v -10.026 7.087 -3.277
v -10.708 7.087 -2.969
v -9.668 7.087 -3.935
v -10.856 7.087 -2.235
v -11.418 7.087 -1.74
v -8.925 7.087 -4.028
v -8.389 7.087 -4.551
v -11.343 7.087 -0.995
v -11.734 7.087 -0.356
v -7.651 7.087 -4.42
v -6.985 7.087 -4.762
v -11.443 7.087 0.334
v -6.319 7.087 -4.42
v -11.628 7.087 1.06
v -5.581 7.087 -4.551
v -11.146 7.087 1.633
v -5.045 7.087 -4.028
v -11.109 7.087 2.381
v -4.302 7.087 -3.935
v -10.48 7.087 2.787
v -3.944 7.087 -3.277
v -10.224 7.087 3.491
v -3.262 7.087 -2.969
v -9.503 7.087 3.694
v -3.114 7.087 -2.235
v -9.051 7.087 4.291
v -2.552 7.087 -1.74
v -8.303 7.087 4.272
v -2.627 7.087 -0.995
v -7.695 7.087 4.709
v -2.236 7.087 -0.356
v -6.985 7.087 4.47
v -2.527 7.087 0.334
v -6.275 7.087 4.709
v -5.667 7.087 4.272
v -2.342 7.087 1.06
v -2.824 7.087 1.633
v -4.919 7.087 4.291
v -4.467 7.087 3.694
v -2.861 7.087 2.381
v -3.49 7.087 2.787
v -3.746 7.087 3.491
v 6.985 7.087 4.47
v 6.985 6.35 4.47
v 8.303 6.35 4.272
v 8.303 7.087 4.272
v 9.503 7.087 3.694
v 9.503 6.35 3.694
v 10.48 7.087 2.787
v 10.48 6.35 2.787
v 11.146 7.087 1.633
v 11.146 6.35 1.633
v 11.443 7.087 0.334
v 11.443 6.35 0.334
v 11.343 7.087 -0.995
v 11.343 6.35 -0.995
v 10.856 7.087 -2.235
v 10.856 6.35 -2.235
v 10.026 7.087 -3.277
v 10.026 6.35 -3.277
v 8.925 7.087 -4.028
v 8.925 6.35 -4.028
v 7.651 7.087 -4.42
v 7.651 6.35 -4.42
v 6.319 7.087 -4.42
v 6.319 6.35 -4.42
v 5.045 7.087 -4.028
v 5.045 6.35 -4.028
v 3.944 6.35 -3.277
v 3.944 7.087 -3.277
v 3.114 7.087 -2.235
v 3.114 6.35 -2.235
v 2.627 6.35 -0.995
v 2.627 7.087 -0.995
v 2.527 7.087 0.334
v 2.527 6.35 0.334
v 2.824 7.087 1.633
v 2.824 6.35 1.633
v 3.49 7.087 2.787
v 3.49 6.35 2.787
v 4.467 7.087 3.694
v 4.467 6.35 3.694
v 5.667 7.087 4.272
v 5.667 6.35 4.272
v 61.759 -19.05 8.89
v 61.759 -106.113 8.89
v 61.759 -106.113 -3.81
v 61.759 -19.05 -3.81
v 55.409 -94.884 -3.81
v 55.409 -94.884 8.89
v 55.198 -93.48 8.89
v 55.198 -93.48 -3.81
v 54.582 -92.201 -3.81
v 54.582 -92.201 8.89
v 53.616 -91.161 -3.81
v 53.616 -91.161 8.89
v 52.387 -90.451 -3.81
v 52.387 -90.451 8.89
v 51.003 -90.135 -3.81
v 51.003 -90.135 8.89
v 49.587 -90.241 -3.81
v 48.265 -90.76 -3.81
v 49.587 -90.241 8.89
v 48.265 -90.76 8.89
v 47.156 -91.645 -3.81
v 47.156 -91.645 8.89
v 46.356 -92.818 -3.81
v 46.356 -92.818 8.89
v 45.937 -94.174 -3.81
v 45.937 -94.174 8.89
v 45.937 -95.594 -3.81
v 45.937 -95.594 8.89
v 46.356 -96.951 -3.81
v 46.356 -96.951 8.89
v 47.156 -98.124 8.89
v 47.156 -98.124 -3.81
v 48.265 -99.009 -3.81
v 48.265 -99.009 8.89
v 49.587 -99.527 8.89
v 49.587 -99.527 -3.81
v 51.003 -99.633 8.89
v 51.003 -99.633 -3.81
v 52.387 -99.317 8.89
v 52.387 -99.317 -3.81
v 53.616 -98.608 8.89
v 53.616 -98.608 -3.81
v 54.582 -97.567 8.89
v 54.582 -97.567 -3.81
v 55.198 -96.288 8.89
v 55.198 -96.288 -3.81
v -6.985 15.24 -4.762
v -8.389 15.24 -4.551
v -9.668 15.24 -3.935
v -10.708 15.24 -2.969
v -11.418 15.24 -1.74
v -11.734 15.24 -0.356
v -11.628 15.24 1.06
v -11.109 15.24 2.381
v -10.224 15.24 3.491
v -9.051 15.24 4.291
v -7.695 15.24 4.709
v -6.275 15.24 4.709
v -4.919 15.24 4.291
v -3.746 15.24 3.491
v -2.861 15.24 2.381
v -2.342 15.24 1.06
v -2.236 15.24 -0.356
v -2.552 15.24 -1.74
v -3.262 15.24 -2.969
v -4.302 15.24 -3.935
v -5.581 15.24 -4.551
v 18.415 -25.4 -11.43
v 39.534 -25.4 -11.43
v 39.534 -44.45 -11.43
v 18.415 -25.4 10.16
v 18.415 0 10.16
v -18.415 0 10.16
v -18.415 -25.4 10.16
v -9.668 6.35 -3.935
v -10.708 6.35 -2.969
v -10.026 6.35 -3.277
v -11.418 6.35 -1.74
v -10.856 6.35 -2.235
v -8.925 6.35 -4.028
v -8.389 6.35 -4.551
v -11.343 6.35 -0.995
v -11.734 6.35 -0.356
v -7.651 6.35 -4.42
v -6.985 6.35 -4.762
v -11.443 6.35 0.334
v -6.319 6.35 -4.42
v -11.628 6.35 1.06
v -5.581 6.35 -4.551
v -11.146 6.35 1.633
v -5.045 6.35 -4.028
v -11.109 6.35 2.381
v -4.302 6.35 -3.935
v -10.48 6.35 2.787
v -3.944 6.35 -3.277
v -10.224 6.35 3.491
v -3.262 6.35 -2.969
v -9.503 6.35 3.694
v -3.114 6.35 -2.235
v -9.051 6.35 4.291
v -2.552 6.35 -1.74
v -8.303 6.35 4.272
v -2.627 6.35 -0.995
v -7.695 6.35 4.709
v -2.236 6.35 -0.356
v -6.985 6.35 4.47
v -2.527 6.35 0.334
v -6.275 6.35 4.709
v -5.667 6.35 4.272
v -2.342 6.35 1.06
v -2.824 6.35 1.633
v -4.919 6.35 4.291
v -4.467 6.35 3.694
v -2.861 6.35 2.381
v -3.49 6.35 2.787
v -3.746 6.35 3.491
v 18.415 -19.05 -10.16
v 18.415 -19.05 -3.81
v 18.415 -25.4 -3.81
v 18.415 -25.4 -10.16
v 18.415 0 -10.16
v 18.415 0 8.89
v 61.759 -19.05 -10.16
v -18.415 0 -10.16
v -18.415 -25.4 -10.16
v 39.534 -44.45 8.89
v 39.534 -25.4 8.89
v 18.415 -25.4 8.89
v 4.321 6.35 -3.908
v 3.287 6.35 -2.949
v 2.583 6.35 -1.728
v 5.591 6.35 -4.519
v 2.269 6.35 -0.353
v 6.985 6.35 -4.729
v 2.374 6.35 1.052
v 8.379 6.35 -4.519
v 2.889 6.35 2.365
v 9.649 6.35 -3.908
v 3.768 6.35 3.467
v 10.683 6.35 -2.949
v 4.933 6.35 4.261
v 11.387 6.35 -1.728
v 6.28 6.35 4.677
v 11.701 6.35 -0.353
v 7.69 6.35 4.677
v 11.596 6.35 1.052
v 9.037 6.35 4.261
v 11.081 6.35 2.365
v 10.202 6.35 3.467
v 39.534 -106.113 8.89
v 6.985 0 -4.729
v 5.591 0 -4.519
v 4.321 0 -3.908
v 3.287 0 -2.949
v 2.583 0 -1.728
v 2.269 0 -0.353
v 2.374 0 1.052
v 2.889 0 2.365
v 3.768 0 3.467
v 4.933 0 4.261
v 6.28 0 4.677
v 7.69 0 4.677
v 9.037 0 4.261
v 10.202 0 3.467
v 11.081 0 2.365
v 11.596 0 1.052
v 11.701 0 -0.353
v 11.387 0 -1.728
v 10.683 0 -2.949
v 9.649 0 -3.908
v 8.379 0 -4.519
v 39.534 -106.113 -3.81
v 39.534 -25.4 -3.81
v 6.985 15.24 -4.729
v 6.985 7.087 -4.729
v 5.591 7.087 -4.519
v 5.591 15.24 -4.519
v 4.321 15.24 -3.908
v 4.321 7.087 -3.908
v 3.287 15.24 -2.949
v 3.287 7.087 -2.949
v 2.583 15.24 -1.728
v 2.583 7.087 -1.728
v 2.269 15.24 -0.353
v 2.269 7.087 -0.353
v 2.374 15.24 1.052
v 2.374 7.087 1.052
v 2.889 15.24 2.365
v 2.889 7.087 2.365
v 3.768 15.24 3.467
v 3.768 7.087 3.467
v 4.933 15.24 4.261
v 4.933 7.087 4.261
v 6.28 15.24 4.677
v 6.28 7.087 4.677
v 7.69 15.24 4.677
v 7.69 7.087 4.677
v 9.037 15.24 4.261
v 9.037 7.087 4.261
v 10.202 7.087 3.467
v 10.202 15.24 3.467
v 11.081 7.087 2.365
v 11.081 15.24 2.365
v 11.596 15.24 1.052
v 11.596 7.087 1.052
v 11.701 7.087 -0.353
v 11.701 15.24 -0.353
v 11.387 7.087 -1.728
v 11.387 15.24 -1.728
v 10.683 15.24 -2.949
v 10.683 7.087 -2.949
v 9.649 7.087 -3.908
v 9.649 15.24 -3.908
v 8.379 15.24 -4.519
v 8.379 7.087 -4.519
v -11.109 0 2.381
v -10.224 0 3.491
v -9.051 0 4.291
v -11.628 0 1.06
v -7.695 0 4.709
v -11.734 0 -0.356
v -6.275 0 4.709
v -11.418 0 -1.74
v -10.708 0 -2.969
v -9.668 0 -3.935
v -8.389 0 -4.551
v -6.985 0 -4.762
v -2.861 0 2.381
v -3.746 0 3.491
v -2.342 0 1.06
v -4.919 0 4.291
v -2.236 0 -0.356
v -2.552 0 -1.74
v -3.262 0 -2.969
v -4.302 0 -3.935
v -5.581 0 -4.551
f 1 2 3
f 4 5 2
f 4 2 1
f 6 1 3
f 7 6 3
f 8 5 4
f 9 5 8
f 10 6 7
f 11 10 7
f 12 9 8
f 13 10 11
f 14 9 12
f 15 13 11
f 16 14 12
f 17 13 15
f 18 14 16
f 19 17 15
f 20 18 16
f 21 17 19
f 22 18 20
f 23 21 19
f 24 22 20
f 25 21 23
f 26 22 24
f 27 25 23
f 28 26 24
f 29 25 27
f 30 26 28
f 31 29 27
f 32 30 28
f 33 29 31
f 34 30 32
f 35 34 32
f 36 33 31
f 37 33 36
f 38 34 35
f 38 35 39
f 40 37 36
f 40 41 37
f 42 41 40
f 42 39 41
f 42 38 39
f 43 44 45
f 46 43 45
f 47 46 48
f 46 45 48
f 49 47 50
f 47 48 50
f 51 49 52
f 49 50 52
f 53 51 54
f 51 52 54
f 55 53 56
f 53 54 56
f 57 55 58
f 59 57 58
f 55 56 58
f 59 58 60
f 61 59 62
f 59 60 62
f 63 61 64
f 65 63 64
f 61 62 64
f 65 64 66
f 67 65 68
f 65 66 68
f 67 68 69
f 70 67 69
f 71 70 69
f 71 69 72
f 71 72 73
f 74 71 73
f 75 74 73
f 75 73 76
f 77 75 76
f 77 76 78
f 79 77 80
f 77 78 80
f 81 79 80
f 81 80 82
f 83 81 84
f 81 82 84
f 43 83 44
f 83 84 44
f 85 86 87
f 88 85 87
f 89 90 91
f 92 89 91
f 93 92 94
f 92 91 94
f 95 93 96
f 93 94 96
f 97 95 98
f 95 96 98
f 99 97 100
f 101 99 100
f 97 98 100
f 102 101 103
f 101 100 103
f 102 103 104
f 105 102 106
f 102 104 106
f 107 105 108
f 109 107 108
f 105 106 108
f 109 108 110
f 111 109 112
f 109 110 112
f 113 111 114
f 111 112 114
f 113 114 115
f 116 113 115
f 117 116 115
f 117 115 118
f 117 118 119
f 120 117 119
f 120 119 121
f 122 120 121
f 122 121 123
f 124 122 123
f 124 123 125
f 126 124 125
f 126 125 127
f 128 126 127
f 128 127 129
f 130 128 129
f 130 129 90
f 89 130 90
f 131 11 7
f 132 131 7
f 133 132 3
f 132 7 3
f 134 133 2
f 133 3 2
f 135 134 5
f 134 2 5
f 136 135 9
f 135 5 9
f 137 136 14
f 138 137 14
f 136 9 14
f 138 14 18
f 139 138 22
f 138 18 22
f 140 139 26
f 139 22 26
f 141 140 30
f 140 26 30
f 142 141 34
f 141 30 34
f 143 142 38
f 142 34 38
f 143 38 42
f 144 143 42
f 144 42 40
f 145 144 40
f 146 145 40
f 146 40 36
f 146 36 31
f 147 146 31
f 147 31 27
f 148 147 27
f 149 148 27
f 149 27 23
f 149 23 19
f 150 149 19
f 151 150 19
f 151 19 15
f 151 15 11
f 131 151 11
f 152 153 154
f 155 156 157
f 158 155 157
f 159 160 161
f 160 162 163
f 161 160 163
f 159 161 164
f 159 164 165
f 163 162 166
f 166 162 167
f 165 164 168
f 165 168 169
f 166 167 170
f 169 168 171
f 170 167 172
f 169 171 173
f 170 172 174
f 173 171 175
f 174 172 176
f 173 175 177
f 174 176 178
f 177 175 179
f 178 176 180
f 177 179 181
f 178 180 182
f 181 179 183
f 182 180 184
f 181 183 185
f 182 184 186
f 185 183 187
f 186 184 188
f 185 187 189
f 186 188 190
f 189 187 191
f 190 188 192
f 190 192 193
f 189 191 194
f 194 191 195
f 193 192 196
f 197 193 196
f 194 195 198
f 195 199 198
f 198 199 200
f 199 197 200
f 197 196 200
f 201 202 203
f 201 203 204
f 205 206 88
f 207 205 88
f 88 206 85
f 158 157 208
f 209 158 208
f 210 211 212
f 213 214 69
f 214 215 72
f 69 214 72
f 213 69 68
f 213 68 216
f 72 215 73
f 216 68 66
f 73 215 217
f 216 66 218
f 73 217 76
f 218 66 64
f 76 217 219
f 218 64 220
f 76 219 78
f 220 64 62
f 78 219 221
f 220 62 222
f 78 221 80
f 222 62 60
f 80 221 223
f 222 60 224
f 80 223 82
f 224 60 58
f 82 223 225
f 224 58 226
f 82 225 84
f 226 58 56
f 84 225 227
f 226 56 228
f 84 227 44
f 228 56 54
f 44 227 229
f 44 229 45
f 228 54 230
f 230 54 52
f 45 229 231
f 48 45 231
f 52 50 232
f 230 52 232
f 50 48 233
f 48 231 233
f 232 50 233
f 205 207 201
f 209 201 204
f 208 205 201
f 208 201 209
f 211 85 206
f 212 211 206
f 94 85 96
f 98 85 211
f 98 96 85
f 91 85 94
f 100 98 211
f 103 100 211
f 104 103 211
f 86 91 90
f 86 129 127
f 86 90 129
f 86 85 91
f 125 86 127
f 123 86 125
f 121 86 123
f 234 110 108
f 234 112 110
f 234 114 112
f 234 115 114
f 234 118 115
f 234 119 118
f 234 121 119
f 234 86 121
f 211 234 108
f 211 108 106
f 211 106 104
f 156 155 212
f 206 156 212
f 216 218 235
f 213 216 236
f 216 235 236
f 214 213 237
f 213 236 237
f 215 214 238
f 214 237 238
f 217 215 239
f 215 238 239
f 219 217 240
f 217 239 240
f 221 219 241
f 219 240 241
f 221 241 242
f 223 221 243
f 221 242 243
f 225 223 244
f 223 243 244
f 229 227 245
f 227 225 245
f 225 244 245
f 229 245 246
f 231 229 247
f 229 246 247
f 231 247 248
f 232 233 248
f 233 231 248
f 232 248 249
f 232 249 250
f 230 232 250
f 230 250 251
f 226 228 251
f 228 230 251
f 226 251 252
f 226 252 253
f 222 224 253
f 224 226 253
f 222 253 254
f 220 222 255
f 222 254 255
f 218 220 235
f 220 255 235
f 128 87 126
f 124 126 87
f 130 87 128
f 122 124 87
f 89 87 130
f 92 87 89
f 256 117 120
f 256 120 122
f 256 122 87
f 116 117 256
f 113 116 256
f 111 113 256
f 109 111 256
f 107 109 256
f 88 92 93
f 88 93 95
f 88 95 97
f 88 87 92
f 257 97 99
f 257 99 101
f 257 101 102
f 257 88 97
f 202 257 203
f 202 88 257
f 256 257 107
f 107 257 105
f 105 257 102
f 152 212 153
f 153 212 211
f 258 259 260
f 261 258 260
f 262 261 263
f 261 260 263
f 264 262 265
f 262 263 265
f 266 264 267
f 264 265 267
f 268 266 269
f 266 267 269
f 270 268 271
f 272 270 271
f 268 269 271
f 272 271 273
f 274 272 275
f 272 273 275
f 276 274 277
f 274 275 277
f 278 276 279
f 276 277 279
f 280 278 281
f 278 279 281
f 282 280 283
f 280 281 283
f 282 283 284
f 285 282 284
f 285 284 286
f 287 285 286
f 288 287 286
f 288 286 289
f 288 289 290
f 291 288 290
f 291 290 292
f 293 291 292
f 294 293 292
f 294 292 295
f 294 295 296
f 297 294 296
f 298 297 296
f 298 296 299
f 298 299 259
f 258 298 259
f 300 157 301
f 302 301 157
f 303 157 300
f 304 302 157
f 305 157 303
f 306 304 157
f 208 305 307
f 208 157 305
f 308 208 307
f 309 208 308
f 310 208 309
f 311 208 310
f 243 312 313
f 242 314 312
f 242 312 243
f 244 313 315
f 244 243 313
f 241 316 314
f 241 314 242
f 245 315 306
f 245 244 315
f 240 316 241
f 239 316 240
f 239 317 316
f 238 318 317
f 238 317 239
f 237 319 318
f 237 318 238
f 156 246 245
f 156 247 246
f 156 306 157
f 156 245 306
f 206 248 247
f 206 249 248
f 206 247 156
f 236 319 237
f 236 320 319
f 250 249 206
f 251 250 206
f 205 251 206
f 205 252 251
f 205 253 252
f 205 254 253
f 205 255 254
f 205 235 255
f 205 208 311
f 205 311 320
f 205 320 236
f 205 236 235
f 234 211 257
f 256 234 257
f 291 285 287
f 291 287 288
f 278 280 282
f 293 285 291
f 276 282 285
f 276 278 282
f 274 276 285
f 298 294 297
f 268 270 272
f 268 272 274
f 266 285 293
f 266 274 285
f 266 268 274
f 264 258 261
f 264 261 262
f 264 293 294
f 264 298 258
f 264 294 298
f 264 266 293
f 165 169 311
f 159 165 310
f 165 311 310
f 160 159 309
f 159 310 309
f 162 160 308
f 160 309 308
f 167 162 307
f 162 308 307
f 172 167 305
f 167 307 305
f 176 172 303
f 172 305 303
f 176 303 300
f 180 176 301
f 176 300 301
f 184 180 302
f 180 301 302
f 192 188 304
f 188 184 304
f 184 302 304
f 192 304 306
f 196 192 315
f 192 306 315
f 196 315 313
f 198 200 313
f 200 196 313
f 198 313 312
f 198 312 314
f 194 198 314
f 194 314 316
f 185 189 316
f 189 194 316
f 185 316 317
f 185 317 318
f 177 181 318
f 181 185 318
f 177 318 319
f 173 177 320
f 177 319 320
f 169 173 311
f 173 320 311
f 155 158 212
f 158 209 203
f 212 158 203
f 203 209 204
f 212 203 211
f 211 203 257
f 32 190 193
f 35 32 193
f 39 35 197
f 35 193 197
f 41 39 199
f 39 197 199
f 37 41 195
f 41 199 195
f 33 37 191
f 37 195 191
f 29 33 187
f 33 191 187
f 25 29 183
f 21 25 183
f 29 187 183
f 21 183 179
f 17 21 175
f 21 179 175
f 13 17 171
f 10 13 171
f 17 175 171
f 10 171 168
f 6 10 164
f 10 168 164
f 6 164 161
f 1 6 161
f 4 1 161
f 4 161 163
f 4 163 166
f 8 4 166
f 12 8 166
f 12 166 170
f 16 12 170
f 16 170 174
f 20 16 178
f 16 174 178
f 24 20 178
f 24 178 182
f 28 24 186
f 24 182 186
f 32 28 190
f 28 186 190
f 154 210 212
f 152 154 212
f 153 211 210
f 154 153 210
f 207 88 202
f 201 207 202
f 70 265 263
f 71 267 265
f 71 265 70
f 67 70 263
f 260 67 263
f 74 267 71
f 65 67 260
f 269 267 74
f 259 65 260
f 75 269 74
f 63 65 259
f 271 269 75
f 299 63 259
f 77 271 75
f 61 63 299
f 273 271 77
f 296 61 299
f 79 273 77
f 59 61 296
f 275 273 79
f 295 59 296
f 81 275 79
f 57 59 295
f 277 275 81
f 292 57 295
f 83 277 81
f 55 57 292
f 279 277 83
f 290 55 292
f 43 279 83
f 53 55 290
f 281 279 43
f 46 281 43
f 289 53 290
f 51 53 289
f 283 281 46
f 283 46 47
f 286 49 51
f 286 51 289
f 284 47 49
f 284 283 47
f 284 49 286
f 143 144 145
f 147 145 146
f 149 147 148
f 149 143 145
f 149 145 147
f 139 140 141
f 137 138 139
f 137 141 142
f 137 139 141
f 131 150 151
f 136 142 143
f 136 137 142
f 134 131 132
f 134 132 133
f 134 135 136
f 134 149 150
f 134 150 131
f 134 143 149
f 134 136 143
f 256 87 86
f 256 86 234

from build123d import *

# Parameters (mm, degrees)
SKETCH1_W            = 36.83
SKETCH1_H            = 20.32
BOSS_EXTRUDE1_DEPTH  = 25.4
SKETCH2_W            = 12.7
SKETCH2_H            = 6.35
BOSS_EXTRUDE2_DEPTH  = 43.344230304
SKETCH3_W            = 22.225
SKETCH3_H            = 12.7
BOSS_EXTRUDE3_DEPTH  = 80.713490592
SKETCH4_R            = 4.7625
CUT_EXTRUDE1_DEPTH   = 125.246440244
SKETCH5_R            = 4.7625
SKETCH5_R_2          = 4.729383401
BOSS_EXTRUDE4_DEPTH  = 15.24
BOSS_EXTRUDE5_DEPTH  = 20.32
SKETCH8_W            = 43.344230304
SKETCH8_H            = 1.27
CUT_EXTRUDE2_DEPTH   = 108.226300513
BOSS_EXTRUDE10_DEPTH = 20.32
F_3DSKETCH3_R        = 5.08
CUT_EXTRUDE4_DEPTH   = 0.7366
SKETCH14_R           = 4.4704
BOSS_EXTRUDE11_DEPTH = 0.7366


with BuildPart() as part:
    # Sketch1 → Boss-Extrude1 (new body)
    with BuildSketch(Plane(origin=(0, 0, 0), x_dir=(1, 0, 0), z_dir=(0, 1, 0))):
        Rectangle(SKETCH1_W, SKETCH1_H)
    extrude(amount=-BOSS_EXTRUDE1_DEPTH)

    # Sketch2 → Boss-Extrude2 (add)
    with BuildSketch(Plane(origin=(18.415, 0, 0), x_dir=(0, 0, -1), z_dir=(1, 0, 0))):
        with Locations((-2.54, -22.225)):
            Rectangle(SKETCH2_W, SKETCH2_H)
    extrude(amount=BOSS_EXTRUDE2_DEPTH)

    # Sketch3 → Boss-Extrude3 (add)
    with BuildSketch(Plane(origin=(0, -25.4, 0), x_dir=(-1, 0, 0), z_dir=(0, -1, 0))):
        with Locations((-50.646730304, -2.54)):
            Rectangle(SKETCH3_W, SKETCH3_H)
    extrude(amount=BOSS_EXTRUDE3_DEPTH)

    # Sketch4 → Cut-Extrude1 (cut, through all)
    with BuildSketch(Plane.XY.offset(8.89)):
        with Locations((50.646730304, -94.884200122)):
            Circle(SKETCH4_R)
    extrude(amount=-CUT_EXTRUDE1_DEPTH, mode=Mode.SUBTRACT)

    # Sketch5 → Boss-Extrude4 (add)
    with BuildSketch(Plane(origin=(0, 0, 0), x_dir=(1, 0, 0), z_dir=(0, 1, 0))):
        with Locations(Location((-6.985, 0, 0), (0, 0, 90))):
            Circle(SKETCH5_R)
        with Locations(Location((6.985, 0, 0), (0, 0, 90))):
            Circle(SKETCH5_R_2)
    extrude(amount=BOSS_EXTRUDE4_DEPTH)

    # Sketch7 → Boss-Extrude5 (add)
    with BuildSketch(Plane.XY.offset(10.16)):
        Polygon((18.415, 0), (61.759230304, -19.05), (18.415, -19.05), align=None)
    extrude(amount=-BOSS_EXTRUDE5_DEPTH)

    # Sketch8 → Cut-Extrude2 (cut, through all)
    with BuildSketch(Plane(origin=(0, -19.05, 0), x_dir=(-1, 0, 0), z_dir=(0, -1, 0))):
        with Locations((-40.087115152, -9.525)):
            Rectangle(SKETCH8_W, SKETCH8_H)
    extrude(amount=-CUT_EXTRUDE2_DEPTH, mode=Mode.SUBTRACT)

    # 3DSketch3 → Cut-Extrude4 (cut)
    with BuildSketch(Plane(origin=(-6.985, 6.35, 0), x_dir=(1, 0, 0), z_dir=(0, -1, 0))):
        Circle(F_3DSKETCH3_R)
        with Locations((13.97, 0)):
            Circle(F_3DSKETCH3_R)
    extrude(amount=-CUT_EXTRUDE4_DEPTH, mode=Mode.SUBTRACT)


with BuildPart() as body_2:
    # Sketch13 → Boss-Extrude10 (new body)
    with BuildSketch(Plane.XY.offset(8.89)):
        Polygon((18.415, -25.4), (39.534230304, -25.4), (39.534230304, -44.45), align=None)
    extrude(amount=-BOSS_EXTRUDE10_DEPTH)


with BuildPart() as cut_extrude4_piece_1:
    # of the separate pieces the step leaves, piece 1, a body of its own (cut_extrude4_pieces)
    add(part.part.solids().sort_by_distance((18.415, 0, 10.16))[0])



with BuildPart() as cut_extrude4_piece_2:
    # of the separate pieces the step leaves, piece 2, a body of its own (cut_extrude4_pieces)
    add(part.part.solids().sort_by_distance((-6.985, 7.0866, -4.7625))[0])


with BuildPart() as cut_extrude4_piece_3:
    # of the separate pieces the step leaves, piece 3, a body of its own (cut_extrude4_pieces)
    add(part.part.solids().sort_by_distance((6.985, 7.0866, -4.729383401))[0])


with BuildPart() as cut_extrude4_piece_1_1:
    add(cut_extrude4_piece_1.part)

    add(cut_extrude4_piece_2.part)  # Boss-Extrude11 merges Cut-Extrude4 piece 2

    add(cut_extrude4_piece_3.part)  # Boss-Extrude11 merges Cut-Extrude4 piece 3
    # Sketch14 → Boss-Extrude11 (add)
    with BuildSketch(Plane(origin=(0, 6.35, 0), x_dir=(1, 0, 0), z_dir=(0, 1, 0))):
        with Locations(Location((-6.985, 0, 0), (0, 0, 270))):
            Circle(SKETCH14_R)
        with Locations(Location((6.985, 0, 0), (0, 0, 270))):
            Circle(SKETCH14_R)
    extrude(amount=BOSS_EXTRUDE11_DEPTH)


solid = Compound([body_2.part, cut_extrude4_piece_1_1.part])
